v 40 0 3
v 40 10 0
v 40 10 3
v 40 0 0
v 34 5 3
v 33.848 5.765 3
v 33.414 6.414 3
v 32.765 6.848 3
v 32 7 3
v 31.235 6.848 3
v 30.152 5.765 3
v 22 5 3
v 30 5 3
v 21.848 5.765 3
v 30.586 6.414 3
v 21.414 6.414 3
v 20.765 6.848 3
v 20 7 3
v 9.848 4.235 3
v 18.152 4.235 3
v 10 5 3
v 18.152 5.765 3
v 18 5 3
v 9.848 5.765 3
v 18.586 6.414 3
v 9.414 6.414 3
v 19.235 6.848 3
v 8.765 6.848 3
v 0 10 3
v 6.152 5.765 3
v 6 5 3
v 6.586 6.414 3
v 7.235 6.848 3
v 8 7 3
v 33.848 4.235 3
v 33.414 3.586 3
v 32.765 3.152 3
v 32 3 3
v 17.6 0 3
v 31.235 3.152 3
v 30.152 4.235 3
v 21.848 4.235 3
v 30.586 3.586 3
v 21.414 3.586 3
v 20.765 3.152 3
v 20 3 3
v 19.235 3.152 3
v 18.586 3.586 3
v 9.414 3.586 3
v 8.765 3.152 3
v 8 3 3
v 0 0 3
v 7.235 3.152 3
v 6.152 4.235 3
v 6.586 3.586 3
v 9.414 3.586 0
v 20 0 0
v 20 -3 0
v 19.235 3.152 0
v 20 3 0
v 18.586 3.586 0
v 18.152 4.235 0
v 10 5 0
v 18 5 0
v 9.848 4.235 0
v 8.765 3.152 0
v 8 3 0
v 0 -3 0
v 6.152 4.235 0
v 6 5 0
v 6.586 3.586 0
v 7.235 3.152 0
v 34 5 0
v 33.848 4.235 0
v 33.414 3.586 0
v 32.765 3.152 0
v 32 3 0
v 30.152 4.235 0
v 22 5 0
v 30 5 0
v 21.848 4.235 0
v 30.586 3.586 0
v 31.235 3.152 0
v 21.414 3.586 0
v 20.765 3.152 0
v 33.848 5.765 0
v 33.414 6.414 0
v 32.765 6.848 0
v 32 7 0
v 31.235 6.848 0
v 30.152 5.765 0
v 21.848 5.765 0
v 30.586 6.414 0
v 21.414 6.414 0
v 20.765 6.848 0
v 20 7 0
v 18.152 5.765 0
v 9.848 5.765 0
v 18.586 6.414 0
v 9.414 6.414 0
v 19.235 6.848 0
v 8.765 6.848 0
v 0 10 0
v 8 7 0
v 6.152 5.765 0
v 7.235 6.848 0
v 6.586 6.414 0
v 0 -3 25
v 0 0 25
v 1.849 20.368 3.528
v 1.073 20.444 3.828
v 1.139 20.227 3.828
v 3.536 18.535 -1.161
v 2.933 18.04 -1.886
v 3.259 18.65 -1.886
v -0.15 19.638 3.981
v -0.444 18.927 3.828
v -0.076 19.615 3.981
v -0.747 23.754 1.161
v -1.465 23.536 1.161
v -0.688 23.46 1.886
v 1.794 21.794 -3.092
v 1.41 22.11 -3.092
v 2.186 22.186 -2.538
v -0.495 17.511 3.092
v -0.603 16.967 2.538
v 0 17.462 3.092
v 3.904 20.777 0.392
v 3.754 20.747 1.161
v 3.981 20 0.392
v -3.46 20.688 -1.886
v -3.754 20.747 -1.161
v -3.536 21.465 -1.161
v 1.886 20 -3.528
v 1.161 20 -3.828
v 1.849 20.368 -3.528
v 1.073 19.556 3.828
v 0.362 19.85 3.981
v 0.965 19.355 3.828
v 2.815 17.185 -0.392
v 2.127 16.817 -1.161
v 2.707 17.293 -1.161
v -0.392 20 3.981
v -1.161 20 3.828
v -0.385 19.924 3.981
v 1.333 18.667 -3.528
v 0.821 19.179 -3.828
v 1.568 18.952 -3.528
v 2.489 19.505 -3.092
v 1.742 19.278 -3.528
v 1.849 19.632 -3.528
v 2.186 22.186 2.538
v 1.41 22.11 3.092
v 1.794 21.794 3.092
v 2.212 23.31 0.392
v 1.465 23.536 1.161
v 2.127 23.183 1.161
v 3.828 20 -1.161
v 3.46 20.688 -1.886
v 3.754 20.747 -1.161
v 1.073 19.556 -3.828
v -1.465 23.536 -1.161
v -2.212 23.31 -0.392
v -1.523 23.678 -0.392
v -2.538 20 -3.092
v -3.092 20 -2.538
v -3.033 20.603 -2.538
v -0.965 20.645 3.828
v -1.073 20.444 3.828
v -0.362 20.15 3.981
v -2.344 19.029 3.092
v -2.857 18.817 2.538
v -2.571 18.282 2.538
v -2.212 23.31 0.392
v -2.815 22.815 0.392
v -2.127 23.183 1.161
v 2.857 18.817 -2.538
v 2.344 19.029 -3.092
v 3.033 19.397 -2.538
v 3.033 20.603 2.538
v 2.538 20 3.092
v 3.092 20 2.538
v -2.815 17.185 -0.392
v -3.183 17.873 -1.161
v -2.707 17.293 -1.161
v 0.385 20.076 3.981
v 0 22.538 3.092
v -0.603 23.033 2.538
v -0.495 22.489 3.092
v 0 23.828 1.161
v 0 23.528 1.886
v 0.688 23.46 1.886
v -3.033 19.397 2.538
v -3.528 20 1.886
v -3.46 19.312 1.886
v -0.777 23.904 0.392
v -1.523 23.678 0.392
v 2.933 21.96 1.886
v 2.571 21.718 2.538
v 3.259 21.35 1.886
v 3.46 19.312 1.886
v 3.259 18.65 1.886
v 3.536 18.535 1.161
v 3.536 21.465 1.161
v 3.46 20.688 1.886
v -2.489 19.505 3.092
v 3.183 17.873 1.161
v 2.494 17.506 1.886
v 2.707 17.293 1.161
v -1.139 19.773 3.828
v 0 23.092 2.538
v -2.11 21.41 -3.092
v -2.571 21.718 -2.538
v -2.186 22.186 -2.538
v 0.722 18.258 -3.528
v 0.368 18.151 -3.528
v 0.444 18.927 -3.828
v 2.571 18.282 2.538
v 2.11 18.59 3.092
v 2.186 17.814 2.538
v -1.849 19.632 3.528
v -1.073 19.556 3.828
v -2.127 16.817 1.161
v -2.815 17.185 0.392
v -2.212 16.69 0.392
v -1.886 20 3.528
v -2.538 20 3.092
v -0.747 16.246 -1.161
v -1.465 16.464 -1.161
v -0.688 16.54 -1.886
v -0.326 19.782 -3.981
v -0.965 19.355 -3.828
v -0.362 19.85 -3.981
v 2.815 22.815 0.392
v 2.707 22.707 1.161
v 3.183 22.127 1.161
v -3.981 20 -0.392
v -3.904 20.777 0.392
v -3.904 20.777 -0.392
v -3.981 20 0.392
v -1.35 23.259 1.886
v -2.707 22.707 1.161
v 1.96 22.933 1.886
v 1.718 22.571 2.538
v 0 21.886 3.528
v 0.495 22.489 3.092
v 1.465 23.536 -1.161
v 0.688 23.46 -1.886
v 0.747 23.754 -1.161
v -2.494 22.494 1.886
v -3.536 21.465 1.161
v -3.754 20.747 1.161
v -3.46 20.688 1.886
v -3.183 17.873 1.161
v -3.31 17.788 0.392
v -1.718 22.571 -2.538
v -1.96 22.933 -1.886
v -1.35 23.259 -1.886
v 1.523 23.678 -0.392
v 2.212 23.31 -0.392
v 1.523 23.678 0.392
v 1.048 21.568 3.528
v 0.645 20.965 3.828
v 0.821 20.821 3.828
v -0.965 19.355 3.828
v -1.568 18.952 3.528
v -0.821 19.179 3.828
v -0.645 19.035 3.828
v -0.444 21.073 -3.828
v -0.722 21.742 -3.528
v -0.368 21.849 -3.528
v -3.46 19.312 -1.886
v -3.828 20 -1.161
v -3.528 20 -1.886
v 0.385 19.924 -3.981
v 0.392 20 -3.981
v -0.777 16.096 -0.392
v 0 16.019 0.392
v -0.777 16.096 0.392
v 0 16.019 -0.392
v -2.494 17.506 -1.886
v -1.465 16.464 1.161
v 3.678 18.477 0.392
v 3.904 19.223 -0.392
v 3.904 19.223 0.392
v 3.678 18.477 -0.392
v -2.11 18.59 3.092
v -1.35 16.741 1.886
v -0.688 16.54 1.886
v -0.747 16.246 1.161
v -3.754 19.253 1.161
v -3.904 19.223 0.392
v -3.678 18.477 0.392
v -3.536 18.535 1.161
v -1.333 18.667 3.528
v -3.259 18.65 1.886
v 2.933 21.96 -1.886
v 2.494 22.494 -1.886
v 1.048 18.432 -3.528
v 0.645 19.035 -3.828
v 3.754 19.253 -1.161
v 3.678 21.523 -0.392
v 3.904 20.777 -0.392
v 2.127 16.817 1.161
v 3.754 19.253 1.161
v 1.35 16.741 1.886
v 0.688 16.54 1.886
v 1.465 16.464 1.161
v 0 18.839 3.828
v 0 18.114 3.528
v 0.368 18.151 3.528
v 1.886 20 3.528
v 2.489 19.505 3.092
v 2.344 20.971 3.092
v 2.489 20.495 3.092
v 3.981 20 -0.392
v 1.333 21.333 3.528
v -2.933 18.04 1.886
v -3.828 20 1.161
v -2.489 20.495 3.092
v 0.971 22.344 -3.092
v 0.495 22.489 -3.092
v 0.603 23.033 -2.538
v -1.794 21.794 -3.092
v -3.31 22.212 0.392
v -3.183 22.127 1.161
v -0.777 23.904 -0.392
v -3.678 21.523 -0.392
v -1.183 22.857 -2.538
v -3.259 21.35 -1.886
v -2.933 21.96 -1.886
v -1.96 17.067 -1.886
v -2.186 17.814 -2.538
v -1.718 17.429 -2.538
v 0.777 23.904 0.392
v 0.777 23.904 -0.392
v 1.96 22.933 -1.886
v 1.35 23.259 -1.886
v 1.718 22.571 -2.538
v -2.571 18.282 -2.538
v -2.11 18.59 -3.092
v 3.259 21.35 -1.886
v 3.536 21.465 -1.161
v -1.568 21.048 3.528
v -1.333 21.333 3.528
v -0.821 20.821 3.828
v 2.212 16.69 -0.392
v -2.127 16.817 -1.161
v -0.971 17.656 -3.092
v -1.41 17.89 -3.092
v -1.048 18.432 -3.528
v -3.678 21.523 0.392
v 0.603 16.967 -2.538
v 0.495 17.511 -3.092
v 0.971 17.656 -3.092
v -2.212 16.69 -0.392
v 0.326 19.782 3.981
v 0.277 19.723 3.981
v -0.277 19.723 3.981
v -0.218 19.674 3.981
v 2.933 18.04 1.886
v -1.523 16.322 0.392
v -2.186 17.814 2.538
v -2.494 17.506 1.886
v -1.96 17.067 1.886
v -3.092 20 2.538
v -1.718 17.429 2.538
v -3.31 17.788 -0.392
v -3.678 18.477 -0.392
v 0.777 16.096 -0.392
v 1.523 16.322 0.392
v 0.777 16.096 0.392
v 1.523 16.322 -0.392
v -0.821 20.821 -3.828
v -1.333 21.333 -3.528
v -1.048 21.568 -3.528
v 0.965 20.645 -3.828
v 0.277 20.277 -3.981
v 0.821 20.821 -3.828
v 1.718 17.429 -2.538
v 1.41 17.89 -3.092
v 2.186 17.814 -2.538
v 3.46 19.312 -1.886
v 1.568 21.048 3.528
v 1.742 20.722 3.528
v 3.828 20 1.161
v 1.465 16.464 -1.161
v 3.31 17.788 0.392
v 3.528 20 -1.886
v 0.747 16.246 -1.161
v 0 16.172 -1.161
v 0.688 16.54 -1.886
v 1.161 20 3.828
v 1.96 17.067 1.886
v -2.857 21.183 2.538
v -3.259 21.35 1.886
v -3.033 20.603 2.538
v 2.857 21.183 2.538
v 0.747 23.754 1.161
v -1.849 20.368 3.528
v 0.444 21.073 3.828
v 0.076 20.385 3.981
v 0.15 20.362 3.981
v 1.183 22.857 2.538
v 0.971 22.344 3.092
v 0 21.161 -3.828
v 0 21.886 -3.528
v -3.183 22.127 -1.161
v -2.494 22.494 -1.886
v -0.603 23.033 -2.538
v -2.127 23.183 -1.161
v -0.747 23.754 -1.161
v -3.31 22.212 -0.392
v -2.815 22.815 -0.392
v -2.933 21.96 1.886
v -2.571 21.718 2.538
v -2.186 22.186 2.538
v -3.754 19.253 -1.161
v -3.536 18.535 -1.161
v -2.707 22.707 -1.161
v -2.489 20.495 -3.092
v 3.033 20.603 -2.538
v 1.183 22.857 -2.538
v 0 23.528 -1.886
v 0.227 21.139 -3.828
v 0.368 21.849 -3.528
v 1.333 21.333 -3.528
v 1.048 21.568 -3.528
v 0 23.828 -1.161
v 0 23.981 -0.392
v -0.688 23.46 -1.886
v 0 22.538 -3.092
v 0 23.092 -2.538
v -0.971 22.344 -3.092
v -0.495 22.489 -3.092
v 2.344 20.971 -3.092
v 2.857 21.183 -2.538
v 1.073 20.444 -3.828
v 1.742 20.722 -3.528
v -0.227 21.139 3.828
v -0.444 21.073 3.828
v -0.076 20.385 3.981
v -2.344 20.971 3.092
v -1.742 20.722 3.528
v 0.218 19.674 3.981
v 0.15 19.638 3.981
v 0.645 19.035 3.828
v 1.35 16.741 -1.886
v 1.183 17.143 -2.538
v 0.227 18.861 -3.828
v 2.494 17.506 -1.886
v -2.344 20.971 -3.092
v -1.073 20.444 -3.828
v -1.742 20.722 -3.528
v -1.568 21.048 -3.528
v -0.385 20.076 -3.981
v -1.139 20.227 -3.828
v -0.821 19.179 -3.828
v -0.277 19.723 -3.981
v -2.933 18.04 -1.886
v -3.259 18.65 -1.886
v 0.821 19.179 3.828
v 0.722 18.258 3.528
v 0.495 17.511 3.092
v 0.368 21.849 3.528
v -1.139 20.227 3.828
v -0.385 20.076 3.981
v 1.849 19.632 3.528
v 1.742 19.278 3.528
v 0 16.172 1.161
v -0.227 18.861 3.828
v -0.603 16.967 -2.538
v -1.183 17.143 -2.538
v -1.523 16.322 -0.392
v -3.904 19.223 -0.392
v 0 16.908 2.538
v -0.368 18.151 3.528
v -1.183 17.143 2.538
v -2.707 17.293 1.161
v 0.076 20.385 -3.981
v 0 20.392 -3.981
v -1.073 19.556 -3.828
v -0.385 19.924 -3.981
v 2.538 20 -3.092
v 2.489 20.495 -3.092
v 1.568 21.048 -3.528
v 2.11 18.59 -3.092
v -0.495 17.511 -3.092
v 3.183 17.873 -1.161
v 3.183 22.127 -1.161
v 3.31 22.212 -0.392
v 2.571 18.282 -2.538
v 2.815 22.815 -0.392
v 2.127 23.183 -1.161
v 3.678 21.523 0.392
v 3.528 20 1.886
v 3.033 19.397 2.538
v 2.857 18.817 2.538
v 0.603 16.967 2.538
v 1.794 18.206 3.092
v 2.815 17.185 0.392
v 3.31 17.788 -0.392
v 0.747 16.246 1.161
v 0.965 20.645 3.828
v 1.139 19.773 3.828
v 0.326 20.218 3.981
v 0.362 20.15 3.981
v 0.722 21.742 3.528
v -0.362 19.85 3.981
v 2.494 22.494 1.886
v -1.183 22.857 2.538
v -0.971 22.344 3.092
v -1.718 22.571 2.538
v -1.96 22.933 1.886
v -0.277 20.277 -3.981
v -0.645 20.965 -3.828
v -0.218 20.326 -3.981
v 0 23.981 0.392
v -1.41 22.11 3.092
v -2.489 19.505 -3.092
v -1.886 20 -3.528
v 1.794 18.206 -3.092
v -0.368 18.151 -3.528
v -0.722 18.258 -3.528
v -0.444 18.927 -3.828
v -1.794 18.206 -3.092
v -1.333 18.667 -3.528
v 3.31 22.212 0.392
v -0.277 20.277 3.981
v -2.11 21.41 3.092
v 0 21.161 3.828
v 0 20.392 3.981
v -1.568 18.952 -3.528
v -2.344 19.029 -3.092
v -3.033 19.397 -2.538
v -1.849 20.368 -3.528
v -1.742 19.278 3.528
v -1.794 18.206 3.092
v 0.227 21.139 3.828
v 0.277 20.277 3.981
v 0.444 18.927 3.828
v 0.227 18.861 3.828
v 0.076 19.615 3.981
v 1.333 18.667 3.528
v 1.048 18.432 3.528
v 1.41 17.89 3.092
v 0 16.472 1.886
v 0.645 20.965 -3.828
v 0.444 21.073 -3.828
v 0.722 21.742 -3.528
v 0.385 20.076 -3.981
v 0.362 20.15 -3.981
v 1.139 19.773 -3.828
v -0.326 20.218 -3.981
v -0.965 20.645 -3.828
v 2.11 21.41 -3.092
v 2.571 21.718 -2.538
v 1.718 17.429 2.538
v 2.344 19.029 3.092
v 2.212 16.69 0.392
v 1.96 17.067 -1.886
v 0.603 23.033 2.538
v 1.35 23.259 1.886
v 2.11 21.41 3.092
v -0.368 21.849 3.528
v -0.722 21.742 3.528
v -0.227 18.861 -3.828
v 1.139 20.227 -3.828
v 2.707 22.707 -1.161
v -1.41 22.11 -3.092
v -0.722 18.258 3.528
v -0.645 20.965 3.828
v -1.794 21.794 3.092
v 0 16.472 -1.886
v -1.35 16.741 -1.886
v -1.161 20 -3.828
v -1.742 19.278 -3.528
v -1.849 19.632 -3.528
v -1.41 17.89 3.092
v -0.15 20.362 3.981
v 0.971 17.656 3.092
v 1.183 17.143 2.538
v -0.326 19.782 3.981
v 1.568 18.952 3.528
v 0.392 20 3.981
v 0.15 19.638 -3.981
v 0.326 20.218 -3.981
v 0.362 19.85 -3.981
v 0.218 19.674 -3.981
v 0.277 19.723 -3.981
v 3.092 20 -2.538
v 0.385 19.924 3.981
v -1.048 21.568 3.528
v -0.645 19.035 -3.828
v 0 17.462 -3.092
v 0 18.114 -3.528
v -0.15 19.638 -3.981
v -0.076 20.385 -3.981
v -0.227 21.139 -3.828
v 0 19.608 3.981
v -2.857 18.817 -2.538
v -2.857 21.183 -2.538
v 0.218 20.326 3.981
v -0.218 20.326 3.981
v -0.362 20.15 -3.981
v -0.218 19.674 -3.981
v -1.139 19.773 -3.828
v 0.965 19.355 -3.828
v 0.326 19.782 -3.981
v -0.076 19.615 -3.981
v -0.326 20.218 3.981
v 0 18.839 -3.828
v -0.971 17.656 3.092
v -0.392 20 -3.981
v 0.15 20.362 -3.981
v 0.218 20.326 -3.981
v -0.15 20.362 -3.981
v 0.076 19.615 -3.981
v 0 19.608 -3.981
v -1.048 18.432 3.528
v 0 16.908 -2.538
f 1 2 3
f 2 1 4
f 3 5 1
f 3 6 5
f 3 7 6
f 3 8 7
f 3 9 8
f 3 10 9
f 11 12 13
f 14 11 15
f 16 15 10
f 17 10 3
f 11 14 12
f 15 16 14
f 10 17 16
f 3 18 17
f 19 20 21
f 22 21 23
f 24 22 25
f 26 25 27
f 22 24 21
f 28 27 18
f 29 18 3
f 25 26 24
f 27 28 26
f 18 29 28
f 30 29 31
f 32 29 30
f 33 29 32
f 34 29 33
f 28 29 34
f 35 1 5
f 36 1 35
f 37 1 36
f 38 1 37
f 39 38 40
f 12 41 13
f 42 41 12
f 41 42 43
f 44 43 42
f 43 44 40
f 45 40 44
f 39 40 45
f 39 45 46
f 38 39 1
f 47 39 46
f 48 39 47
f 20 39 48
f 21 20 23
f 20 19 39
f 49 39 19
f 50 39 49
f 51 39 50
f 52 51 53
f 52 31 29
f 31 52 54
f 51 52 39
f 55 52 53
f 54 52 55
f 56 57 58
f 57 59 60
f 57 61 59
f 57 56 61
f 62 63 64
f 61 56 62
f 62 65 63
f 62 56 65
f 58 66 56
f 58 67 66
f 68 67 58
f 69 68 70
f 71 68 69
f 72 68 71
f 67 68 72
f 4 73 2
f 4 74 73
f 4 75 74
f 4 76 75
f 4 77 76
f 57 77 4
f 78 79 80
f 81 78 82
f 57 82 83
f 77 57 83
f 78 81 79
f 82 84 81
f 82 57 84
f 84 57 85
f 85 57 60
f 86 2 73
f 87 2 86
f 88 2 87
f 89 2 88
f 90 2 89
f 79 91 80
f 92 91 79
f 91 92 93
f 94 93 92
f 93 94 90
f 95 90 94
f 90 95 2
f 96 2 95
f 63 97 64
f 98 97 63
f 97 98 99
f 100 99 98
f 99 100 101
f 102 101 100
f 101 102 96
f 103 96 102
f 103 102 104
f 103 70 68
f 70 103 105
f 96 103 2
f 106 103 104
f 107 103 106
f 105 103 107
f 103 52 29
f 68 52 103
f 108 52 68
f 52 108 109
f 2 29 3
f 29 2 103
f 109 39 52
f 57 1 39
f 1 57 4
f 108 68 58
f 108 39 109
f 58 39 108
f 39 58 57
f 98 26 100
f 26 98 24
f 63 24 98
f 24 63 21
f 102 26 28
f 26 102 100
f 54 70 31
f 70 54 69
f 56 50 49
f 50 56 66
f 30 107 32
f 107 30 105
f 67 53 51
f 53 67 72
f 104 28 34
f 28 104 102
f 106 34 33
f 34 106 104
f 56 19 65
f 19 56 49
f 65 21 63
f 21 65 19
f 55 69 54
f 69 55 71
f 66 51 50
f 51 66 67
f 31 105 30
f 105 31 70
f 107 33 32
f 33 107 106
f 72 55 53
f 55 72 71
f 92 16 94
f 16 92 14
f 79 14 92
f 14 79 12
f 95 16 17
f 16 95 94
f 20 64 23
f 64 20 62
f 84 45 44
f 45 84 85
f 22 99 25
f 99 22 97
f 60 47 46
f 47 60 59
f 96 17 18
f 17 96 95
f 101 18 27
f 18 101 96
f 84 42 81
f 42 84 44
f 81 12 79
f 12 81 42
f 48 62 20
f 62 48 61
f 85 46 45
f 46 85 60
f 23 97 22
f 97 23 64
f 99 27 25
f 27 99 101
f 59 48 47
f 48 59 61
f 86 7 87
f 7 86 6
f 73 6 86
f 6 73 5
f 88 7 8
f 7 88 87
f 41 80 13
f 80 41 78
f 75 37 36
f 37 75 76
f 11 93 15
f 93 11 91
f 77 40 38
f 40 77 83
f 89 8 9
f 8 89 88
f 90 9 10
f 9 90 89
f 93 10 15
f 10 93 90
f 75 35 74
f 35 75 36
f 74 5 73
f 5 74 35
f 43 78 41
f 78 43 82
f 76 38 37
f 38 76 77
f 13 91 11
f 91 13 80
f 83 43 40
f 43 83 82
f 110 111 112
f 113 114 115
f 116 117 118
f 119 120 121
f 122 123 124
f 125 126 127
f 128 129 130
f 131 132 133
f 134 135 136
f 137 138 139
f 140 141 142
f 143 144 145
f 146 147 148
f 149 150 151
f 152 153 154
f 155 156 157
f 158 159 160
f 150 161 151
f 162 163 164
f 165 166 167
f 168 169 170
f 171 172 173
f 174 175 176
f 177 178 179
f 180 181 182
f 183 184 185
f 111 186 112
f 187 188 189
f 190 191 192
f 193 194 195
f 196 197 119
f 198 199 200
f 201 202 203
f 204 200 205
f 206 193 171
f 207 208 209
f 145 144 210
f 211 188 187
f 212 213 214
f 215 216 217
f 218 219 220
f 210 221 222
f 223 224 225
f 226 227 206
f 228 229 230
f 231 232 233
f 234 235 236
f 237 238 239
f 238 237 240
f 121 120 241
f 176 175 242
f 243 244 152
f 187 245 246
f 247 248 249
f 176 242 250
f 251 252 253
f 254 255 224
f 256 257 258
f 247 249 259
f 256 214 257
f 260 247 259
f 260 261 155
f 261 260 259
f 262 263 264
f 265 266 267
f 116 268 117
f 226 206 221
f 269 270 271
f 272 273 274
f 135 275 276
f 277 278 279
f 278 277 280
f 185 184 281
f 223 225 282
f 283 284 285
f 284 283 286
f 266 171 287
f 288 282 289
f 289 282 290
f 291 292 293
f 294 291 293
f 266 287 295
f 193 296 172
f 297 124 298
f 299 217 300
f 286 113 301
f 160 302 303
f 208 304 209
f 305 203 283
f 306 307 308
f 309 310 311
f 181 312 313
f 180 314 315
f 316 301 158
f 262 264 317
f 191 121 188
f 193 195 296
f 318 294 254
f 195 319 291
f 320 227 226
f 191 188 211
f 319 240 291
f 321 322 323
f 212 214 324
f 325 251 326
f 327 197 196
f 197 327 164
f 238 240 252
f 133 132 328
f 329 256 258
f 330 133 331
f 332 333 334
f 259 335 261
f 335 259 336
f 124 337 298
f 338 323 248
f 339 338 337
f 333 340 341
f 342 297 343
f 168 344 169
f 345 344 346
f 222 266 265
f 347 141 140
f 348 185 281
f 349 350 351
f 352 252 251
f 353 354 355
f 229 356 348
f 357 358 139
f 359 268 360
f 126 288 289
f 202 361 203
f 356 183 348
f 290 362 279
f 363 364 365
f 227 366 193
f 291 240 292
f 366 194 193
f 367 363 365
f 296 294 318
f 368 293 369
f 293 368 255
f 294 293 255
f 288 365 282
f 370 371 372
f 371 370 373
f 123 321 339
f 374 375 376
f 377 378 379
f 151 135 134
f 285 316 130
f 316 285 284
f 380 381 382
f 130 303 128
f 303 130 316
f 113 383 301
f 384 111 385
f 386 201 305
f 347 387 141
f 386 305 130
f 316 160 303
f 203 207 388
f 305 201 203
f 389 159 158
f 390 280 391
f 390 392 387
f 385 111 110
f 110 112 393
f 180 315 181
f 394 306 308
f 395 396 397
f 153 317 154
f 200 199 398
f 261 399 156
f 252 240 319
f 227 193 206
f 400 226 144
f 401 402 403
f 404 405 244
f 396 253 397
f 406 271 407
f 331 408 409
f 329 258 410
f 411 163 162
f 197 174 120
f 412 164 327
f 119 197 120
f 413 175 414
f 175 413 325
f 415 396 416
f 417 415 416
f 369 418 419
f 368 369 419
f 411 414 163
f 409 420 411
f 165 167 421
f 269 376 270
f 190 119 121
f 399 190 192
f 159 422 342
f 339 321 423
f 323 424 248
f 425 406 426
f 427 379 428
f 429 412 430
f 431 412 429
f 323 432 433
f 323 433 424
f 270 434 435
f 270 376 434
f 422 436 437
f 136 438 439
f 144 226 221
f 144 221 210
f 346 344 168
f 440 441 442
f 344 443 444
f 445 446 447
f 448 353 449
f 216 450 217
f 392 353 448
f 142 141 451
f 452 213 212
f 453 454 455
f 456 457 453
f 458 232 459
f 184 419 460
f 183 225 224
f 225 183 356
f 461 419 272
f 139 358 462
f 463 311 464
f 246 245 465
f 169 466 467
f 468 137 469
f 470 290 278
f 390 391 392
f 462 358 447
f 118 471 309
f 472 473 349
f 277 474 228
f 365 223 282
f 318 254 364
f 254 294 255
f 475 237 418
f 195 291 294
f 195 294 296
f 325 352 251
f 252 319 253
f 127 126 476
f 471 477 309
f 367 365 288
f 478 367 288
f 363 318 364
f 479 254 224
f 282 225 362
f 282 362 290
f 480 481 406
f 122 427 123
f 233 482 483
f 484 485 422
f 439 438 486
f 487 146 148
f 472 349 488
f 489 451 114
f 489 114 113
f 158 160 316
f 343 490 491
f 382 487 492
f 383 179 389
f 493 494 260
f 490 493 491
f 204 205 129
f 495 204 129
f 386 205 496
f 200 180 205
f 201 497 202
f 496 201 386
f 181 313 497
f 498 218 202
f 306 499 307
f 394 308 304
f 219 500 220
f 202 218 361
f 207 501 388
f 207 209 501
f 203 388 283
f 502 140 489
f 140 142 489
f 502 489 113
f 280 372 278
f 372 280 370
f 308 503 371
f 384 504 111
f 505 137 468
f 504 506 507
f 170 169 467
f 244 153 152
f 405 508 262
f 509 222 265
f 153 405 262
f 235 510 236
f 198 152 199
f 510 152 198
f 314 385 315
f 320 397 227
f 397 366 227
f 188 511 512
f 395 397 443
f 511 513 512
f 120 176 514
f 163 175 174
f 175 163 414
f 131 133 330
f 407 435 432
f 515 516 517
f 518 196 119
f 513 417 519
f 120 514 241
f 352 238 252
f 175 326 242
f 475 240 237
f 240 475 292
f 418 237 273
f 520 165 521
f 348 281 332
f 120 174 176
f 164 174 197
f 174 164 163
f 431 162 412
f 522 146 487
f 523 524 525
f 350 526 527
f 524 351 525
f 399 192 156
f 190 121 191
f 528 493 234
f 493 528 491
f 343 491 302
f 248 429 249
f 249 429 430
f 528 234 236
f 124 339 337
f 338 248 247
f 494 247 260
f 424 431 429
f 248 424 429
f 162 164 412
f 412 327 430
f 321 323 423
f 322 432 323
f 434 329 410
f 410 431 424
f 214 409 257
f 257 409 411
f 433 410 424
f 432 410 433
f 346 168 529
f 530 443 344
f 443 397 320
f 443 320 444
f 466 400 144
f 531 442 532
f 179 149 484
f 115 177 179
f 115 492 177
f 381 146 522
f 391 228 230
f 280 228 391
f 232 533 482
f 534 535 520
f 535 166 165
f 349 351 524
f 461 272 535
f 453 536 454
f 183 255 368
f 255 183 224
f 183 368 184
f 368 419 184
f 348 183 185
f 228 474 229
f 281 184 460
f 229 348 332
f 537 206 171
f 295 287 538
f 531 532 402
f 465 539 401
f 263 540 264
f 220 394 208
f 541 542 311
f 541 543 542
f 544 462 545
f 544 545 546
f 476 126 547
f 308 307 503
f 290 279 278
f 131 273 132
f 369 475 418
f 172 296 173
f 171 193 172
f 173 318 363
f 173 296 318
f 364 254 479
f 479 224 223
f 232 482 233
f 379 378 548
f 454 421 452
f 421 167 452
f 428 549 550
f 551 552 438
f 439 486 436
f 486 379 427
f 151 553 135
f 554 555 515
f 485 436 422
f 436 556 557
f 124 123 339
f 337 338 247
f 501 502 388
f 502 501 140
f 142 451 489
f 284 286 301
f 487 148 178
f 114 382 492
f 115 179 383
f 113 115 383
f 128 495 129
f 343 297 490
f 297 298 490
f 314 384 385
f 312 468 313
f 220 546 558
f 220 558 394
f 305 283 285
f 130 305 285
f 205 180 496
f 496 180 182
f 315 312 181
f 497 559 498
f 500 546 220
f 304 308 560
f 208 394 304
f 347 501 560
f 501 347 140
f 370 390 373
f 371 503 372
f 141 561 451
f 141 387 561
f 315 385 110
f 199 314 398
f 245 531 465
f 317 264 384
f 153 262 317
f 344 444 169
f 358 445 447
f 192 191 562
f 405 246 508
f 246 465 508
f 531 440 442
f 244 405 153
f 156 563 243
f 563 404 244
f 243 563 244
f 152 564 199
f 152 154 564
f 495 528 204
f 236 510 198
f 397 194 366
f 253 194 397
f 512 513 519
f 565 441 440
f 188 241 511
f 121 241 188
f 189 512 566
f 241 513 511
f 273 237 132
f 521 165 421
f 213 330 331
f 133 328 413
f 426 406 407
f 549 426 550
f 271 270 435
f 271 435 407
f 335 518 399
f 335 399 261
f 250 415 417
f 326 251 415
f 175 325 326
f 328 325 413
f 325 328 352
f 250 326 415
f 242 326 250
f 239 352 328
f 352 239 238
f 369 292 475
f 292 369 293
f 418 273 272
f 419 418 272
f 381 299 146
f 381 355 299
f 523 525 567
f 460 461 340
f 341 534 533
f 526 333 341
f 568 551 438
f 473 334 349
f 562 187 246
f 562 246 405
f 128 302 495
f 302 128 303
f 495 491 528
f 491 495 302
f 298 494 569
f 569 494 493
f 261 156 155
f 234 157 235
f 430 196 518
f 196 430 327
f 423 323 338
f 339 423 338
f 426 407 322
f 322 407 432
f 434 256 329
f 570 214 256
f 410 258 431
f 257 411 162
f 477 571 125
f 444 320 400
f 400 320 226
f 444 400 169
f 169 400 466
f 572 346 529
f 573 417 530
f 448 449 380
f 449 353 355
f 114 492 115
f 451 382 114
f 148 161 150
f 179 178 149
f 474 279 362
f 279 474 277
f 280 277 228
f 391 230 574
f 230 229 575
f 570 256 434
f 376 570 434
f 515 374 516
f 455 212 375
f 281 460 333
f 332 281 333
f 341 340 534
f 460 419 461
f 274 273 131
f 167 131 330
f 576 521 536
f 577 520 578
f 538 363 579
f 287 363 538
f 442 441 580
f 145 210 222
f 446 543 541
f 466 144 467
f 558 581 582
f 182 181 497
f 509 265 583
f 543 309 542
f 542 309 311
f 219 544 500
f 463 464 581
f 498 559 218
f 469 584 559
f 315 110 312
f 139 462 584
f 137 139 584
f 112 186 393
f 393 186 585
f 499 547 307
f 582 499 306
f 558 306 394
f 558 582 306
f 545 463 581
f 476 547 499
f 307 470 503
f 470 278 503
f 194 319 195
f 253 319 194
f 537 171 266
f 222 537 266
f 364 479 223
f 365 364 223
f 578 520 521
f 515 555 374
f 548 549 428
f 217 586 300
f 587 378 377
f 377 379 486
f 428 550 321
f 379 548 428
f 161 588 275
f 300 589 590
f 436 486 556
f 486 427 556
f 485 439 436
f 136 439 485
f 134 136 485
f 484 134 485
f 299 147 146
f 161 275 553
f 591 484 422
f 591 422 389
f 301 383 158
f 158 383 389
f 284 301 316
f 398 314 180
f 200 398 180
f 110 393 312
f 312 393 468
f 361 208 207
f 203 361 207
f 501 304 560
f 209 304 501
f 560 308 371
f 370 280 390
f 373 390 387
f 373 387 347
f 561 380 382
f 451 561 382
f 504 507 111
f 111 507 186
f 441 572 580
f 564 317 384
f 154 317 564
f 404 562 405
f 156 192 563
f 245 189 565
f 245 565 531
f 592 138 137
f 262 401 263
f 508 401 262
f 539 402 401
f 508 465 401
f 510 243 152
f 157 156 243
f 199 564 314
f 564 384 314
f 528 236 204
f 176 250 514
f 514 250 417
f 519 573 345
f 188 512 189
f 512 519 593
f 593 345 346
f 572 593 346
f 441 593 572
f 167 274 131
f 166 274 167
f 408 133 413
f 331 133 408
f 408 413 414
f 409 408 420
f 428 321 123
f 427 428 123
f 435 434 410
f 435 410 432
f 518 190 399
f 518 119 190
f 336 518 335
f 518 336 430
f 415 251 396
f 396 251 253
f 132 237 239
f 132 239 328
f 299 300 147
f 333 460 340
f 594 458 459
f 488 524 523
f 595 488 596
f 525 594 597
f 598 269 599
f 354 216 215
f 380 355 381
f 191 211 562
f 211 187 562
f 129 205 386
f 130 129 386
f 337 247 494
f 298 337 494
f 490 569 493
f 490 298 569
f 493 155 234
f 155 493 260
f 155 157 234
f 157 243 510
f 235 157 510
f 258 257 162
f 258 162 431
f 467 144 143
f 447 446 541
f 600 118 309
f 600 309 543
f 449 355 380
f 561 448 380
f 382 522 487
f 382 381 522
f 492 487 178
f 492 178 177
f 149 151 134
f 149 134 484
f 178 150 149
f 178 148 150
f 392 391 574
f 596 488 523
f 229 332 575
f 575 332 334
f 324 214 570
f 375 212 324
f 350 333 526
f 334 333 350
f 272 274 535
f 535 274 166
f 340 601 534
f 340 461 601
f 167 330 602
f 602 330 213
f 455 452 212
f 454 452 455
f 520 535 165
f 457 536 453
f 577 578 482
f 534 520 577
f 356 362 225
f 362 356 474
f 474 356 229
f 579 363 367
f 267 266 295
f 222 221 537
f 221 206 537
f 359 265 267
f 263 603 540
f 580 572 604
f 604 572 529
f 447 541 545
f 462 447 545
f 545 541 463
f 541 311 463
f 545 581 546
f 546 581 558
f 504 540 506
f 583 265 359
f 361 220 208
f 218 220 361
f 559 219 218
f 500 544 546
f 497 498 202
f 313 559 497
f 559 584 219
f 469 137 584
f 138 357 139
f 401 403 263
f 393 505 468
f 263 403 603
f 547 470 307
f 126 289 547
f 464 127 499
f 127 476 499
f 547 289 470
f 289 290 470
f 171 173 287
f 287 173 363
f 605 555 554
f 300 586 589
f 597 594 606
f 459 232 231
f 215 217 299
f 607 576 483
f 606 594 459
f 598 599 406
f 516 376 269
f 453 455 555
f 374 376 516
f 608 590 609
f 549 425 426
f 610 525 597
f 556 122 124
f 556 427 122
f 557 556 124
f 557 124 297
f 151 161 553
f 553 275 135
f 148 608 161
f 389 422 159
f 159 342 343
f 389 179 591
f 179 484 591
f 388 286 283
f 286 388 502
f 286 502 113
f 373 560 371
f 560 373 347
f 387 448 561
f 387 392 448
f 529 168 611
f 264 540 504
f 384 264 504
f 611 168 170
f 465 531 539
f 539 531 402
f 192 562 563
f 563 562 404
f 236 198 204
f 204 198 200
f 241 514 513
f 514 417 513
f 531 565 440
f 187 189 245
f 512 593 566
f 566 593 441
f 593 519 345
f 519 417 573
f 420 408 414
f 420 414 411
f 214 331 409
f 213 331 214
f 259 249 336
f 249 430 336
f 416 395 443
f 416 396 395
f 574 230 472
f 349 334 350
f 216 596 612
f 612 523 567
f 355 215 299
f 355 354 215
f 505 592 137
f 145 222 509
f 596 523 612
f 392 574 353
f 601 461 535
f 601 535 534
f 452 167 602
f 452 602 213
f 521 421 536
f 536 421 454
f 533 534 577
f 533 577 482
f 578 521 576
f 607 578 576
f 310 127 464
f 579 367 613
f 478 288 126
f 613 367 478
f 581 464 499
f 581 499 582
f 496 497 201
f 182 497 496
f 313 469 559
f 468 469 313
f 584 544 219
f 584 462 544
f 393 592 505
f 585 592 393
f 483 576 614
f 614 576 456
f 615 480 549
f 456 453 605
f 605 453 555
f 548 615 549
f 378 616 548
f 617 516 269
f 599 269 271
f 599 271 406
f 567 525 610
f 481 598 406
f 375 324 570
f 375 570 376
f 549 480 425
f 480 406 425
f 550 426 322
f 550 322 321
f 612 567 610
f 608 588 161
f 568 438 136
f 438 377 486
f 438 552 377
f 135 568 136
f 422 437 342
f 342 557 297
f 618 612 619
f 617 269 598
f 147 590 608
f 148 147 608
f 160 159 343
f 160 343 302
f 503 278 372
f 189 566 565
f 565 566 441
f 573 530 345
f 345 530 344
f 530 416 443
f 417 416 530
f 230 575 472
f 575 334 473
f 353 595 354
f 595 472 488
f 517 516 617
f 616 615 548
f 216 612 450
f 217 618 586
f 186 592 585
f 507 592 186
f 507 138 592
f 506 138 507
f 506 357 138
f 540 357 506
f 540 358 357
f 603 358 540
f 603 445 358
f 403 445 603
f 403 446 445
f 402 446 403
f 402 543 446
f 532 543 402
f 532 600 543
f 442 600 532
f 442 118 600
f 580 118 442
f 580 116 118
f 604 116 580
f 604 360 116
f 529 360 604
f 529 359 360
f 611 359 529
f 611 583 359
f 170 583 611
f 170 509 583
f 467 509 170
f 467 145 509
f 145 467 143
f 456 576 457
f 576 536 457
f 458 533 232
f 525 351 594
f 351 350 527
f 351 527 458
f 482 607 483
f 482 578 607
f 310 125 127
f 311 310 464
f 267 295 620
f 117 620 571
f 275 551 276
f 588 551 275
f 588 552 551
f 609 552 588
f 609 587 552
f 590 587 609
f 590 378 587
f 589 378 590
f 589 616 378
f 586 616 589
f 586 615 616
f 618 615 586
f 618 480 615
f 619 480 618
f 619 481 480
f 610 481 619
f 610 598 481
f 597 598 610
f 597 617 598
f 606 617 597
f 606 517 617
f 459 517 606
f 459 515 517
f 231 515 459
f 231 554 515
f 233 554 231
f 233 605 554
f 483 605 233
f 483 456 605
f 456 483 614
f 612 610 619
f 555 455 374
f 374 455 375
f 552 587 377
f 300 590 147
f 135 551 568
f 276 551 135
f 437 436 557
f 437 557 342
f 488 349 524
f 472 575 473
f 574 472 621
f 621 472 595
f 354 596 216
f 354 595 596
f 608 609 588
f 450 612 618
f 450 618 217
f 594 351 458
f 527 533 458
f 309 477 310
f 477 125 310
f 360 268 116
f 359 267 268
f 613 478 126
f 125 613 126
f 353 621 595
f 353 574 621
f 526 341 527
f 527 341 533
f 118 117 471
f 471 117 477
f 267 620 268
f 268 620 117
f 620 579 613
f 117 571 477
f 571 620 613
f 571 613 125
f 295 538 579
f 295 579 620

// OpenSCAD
// Evaluation fixture: the instantiation tree of a parametric part, with modifiers, fragment settings and
// the group nodes created by user modules and loops. The tree is compared with eval-instance-tree.tree.txt.

width = 40;
height = 25;
hole_count = 3;
hole_r = 2;

function hole_x(i) = 8 + i * (width - 16) / (hole_count - 1);

module plate() {
    cube([width, 10, 3]);
}

module holes() {
    for (i = [0 : hole_count - 1])
        translate([hole_x(i), 5, -1])
            cylinder(h = 5, r = hole_r, $fn = 16);
}

module rib() {
    rotate([90, 0, 0])
        linear_extrude(height = 3)
            polygon([[0, 0], [width / 2, 0], [0, height]]);
}

module bracket() {
    difference() {
        union() {
            plate();
            rib();
        }
        holes();
    }
}

$fn = 32;
bracket();
#translate([0, 20, 0]) sphere(r = 4);
%color("red") cube(1);
*cube(1000);
echo("instances built", hole_count);
